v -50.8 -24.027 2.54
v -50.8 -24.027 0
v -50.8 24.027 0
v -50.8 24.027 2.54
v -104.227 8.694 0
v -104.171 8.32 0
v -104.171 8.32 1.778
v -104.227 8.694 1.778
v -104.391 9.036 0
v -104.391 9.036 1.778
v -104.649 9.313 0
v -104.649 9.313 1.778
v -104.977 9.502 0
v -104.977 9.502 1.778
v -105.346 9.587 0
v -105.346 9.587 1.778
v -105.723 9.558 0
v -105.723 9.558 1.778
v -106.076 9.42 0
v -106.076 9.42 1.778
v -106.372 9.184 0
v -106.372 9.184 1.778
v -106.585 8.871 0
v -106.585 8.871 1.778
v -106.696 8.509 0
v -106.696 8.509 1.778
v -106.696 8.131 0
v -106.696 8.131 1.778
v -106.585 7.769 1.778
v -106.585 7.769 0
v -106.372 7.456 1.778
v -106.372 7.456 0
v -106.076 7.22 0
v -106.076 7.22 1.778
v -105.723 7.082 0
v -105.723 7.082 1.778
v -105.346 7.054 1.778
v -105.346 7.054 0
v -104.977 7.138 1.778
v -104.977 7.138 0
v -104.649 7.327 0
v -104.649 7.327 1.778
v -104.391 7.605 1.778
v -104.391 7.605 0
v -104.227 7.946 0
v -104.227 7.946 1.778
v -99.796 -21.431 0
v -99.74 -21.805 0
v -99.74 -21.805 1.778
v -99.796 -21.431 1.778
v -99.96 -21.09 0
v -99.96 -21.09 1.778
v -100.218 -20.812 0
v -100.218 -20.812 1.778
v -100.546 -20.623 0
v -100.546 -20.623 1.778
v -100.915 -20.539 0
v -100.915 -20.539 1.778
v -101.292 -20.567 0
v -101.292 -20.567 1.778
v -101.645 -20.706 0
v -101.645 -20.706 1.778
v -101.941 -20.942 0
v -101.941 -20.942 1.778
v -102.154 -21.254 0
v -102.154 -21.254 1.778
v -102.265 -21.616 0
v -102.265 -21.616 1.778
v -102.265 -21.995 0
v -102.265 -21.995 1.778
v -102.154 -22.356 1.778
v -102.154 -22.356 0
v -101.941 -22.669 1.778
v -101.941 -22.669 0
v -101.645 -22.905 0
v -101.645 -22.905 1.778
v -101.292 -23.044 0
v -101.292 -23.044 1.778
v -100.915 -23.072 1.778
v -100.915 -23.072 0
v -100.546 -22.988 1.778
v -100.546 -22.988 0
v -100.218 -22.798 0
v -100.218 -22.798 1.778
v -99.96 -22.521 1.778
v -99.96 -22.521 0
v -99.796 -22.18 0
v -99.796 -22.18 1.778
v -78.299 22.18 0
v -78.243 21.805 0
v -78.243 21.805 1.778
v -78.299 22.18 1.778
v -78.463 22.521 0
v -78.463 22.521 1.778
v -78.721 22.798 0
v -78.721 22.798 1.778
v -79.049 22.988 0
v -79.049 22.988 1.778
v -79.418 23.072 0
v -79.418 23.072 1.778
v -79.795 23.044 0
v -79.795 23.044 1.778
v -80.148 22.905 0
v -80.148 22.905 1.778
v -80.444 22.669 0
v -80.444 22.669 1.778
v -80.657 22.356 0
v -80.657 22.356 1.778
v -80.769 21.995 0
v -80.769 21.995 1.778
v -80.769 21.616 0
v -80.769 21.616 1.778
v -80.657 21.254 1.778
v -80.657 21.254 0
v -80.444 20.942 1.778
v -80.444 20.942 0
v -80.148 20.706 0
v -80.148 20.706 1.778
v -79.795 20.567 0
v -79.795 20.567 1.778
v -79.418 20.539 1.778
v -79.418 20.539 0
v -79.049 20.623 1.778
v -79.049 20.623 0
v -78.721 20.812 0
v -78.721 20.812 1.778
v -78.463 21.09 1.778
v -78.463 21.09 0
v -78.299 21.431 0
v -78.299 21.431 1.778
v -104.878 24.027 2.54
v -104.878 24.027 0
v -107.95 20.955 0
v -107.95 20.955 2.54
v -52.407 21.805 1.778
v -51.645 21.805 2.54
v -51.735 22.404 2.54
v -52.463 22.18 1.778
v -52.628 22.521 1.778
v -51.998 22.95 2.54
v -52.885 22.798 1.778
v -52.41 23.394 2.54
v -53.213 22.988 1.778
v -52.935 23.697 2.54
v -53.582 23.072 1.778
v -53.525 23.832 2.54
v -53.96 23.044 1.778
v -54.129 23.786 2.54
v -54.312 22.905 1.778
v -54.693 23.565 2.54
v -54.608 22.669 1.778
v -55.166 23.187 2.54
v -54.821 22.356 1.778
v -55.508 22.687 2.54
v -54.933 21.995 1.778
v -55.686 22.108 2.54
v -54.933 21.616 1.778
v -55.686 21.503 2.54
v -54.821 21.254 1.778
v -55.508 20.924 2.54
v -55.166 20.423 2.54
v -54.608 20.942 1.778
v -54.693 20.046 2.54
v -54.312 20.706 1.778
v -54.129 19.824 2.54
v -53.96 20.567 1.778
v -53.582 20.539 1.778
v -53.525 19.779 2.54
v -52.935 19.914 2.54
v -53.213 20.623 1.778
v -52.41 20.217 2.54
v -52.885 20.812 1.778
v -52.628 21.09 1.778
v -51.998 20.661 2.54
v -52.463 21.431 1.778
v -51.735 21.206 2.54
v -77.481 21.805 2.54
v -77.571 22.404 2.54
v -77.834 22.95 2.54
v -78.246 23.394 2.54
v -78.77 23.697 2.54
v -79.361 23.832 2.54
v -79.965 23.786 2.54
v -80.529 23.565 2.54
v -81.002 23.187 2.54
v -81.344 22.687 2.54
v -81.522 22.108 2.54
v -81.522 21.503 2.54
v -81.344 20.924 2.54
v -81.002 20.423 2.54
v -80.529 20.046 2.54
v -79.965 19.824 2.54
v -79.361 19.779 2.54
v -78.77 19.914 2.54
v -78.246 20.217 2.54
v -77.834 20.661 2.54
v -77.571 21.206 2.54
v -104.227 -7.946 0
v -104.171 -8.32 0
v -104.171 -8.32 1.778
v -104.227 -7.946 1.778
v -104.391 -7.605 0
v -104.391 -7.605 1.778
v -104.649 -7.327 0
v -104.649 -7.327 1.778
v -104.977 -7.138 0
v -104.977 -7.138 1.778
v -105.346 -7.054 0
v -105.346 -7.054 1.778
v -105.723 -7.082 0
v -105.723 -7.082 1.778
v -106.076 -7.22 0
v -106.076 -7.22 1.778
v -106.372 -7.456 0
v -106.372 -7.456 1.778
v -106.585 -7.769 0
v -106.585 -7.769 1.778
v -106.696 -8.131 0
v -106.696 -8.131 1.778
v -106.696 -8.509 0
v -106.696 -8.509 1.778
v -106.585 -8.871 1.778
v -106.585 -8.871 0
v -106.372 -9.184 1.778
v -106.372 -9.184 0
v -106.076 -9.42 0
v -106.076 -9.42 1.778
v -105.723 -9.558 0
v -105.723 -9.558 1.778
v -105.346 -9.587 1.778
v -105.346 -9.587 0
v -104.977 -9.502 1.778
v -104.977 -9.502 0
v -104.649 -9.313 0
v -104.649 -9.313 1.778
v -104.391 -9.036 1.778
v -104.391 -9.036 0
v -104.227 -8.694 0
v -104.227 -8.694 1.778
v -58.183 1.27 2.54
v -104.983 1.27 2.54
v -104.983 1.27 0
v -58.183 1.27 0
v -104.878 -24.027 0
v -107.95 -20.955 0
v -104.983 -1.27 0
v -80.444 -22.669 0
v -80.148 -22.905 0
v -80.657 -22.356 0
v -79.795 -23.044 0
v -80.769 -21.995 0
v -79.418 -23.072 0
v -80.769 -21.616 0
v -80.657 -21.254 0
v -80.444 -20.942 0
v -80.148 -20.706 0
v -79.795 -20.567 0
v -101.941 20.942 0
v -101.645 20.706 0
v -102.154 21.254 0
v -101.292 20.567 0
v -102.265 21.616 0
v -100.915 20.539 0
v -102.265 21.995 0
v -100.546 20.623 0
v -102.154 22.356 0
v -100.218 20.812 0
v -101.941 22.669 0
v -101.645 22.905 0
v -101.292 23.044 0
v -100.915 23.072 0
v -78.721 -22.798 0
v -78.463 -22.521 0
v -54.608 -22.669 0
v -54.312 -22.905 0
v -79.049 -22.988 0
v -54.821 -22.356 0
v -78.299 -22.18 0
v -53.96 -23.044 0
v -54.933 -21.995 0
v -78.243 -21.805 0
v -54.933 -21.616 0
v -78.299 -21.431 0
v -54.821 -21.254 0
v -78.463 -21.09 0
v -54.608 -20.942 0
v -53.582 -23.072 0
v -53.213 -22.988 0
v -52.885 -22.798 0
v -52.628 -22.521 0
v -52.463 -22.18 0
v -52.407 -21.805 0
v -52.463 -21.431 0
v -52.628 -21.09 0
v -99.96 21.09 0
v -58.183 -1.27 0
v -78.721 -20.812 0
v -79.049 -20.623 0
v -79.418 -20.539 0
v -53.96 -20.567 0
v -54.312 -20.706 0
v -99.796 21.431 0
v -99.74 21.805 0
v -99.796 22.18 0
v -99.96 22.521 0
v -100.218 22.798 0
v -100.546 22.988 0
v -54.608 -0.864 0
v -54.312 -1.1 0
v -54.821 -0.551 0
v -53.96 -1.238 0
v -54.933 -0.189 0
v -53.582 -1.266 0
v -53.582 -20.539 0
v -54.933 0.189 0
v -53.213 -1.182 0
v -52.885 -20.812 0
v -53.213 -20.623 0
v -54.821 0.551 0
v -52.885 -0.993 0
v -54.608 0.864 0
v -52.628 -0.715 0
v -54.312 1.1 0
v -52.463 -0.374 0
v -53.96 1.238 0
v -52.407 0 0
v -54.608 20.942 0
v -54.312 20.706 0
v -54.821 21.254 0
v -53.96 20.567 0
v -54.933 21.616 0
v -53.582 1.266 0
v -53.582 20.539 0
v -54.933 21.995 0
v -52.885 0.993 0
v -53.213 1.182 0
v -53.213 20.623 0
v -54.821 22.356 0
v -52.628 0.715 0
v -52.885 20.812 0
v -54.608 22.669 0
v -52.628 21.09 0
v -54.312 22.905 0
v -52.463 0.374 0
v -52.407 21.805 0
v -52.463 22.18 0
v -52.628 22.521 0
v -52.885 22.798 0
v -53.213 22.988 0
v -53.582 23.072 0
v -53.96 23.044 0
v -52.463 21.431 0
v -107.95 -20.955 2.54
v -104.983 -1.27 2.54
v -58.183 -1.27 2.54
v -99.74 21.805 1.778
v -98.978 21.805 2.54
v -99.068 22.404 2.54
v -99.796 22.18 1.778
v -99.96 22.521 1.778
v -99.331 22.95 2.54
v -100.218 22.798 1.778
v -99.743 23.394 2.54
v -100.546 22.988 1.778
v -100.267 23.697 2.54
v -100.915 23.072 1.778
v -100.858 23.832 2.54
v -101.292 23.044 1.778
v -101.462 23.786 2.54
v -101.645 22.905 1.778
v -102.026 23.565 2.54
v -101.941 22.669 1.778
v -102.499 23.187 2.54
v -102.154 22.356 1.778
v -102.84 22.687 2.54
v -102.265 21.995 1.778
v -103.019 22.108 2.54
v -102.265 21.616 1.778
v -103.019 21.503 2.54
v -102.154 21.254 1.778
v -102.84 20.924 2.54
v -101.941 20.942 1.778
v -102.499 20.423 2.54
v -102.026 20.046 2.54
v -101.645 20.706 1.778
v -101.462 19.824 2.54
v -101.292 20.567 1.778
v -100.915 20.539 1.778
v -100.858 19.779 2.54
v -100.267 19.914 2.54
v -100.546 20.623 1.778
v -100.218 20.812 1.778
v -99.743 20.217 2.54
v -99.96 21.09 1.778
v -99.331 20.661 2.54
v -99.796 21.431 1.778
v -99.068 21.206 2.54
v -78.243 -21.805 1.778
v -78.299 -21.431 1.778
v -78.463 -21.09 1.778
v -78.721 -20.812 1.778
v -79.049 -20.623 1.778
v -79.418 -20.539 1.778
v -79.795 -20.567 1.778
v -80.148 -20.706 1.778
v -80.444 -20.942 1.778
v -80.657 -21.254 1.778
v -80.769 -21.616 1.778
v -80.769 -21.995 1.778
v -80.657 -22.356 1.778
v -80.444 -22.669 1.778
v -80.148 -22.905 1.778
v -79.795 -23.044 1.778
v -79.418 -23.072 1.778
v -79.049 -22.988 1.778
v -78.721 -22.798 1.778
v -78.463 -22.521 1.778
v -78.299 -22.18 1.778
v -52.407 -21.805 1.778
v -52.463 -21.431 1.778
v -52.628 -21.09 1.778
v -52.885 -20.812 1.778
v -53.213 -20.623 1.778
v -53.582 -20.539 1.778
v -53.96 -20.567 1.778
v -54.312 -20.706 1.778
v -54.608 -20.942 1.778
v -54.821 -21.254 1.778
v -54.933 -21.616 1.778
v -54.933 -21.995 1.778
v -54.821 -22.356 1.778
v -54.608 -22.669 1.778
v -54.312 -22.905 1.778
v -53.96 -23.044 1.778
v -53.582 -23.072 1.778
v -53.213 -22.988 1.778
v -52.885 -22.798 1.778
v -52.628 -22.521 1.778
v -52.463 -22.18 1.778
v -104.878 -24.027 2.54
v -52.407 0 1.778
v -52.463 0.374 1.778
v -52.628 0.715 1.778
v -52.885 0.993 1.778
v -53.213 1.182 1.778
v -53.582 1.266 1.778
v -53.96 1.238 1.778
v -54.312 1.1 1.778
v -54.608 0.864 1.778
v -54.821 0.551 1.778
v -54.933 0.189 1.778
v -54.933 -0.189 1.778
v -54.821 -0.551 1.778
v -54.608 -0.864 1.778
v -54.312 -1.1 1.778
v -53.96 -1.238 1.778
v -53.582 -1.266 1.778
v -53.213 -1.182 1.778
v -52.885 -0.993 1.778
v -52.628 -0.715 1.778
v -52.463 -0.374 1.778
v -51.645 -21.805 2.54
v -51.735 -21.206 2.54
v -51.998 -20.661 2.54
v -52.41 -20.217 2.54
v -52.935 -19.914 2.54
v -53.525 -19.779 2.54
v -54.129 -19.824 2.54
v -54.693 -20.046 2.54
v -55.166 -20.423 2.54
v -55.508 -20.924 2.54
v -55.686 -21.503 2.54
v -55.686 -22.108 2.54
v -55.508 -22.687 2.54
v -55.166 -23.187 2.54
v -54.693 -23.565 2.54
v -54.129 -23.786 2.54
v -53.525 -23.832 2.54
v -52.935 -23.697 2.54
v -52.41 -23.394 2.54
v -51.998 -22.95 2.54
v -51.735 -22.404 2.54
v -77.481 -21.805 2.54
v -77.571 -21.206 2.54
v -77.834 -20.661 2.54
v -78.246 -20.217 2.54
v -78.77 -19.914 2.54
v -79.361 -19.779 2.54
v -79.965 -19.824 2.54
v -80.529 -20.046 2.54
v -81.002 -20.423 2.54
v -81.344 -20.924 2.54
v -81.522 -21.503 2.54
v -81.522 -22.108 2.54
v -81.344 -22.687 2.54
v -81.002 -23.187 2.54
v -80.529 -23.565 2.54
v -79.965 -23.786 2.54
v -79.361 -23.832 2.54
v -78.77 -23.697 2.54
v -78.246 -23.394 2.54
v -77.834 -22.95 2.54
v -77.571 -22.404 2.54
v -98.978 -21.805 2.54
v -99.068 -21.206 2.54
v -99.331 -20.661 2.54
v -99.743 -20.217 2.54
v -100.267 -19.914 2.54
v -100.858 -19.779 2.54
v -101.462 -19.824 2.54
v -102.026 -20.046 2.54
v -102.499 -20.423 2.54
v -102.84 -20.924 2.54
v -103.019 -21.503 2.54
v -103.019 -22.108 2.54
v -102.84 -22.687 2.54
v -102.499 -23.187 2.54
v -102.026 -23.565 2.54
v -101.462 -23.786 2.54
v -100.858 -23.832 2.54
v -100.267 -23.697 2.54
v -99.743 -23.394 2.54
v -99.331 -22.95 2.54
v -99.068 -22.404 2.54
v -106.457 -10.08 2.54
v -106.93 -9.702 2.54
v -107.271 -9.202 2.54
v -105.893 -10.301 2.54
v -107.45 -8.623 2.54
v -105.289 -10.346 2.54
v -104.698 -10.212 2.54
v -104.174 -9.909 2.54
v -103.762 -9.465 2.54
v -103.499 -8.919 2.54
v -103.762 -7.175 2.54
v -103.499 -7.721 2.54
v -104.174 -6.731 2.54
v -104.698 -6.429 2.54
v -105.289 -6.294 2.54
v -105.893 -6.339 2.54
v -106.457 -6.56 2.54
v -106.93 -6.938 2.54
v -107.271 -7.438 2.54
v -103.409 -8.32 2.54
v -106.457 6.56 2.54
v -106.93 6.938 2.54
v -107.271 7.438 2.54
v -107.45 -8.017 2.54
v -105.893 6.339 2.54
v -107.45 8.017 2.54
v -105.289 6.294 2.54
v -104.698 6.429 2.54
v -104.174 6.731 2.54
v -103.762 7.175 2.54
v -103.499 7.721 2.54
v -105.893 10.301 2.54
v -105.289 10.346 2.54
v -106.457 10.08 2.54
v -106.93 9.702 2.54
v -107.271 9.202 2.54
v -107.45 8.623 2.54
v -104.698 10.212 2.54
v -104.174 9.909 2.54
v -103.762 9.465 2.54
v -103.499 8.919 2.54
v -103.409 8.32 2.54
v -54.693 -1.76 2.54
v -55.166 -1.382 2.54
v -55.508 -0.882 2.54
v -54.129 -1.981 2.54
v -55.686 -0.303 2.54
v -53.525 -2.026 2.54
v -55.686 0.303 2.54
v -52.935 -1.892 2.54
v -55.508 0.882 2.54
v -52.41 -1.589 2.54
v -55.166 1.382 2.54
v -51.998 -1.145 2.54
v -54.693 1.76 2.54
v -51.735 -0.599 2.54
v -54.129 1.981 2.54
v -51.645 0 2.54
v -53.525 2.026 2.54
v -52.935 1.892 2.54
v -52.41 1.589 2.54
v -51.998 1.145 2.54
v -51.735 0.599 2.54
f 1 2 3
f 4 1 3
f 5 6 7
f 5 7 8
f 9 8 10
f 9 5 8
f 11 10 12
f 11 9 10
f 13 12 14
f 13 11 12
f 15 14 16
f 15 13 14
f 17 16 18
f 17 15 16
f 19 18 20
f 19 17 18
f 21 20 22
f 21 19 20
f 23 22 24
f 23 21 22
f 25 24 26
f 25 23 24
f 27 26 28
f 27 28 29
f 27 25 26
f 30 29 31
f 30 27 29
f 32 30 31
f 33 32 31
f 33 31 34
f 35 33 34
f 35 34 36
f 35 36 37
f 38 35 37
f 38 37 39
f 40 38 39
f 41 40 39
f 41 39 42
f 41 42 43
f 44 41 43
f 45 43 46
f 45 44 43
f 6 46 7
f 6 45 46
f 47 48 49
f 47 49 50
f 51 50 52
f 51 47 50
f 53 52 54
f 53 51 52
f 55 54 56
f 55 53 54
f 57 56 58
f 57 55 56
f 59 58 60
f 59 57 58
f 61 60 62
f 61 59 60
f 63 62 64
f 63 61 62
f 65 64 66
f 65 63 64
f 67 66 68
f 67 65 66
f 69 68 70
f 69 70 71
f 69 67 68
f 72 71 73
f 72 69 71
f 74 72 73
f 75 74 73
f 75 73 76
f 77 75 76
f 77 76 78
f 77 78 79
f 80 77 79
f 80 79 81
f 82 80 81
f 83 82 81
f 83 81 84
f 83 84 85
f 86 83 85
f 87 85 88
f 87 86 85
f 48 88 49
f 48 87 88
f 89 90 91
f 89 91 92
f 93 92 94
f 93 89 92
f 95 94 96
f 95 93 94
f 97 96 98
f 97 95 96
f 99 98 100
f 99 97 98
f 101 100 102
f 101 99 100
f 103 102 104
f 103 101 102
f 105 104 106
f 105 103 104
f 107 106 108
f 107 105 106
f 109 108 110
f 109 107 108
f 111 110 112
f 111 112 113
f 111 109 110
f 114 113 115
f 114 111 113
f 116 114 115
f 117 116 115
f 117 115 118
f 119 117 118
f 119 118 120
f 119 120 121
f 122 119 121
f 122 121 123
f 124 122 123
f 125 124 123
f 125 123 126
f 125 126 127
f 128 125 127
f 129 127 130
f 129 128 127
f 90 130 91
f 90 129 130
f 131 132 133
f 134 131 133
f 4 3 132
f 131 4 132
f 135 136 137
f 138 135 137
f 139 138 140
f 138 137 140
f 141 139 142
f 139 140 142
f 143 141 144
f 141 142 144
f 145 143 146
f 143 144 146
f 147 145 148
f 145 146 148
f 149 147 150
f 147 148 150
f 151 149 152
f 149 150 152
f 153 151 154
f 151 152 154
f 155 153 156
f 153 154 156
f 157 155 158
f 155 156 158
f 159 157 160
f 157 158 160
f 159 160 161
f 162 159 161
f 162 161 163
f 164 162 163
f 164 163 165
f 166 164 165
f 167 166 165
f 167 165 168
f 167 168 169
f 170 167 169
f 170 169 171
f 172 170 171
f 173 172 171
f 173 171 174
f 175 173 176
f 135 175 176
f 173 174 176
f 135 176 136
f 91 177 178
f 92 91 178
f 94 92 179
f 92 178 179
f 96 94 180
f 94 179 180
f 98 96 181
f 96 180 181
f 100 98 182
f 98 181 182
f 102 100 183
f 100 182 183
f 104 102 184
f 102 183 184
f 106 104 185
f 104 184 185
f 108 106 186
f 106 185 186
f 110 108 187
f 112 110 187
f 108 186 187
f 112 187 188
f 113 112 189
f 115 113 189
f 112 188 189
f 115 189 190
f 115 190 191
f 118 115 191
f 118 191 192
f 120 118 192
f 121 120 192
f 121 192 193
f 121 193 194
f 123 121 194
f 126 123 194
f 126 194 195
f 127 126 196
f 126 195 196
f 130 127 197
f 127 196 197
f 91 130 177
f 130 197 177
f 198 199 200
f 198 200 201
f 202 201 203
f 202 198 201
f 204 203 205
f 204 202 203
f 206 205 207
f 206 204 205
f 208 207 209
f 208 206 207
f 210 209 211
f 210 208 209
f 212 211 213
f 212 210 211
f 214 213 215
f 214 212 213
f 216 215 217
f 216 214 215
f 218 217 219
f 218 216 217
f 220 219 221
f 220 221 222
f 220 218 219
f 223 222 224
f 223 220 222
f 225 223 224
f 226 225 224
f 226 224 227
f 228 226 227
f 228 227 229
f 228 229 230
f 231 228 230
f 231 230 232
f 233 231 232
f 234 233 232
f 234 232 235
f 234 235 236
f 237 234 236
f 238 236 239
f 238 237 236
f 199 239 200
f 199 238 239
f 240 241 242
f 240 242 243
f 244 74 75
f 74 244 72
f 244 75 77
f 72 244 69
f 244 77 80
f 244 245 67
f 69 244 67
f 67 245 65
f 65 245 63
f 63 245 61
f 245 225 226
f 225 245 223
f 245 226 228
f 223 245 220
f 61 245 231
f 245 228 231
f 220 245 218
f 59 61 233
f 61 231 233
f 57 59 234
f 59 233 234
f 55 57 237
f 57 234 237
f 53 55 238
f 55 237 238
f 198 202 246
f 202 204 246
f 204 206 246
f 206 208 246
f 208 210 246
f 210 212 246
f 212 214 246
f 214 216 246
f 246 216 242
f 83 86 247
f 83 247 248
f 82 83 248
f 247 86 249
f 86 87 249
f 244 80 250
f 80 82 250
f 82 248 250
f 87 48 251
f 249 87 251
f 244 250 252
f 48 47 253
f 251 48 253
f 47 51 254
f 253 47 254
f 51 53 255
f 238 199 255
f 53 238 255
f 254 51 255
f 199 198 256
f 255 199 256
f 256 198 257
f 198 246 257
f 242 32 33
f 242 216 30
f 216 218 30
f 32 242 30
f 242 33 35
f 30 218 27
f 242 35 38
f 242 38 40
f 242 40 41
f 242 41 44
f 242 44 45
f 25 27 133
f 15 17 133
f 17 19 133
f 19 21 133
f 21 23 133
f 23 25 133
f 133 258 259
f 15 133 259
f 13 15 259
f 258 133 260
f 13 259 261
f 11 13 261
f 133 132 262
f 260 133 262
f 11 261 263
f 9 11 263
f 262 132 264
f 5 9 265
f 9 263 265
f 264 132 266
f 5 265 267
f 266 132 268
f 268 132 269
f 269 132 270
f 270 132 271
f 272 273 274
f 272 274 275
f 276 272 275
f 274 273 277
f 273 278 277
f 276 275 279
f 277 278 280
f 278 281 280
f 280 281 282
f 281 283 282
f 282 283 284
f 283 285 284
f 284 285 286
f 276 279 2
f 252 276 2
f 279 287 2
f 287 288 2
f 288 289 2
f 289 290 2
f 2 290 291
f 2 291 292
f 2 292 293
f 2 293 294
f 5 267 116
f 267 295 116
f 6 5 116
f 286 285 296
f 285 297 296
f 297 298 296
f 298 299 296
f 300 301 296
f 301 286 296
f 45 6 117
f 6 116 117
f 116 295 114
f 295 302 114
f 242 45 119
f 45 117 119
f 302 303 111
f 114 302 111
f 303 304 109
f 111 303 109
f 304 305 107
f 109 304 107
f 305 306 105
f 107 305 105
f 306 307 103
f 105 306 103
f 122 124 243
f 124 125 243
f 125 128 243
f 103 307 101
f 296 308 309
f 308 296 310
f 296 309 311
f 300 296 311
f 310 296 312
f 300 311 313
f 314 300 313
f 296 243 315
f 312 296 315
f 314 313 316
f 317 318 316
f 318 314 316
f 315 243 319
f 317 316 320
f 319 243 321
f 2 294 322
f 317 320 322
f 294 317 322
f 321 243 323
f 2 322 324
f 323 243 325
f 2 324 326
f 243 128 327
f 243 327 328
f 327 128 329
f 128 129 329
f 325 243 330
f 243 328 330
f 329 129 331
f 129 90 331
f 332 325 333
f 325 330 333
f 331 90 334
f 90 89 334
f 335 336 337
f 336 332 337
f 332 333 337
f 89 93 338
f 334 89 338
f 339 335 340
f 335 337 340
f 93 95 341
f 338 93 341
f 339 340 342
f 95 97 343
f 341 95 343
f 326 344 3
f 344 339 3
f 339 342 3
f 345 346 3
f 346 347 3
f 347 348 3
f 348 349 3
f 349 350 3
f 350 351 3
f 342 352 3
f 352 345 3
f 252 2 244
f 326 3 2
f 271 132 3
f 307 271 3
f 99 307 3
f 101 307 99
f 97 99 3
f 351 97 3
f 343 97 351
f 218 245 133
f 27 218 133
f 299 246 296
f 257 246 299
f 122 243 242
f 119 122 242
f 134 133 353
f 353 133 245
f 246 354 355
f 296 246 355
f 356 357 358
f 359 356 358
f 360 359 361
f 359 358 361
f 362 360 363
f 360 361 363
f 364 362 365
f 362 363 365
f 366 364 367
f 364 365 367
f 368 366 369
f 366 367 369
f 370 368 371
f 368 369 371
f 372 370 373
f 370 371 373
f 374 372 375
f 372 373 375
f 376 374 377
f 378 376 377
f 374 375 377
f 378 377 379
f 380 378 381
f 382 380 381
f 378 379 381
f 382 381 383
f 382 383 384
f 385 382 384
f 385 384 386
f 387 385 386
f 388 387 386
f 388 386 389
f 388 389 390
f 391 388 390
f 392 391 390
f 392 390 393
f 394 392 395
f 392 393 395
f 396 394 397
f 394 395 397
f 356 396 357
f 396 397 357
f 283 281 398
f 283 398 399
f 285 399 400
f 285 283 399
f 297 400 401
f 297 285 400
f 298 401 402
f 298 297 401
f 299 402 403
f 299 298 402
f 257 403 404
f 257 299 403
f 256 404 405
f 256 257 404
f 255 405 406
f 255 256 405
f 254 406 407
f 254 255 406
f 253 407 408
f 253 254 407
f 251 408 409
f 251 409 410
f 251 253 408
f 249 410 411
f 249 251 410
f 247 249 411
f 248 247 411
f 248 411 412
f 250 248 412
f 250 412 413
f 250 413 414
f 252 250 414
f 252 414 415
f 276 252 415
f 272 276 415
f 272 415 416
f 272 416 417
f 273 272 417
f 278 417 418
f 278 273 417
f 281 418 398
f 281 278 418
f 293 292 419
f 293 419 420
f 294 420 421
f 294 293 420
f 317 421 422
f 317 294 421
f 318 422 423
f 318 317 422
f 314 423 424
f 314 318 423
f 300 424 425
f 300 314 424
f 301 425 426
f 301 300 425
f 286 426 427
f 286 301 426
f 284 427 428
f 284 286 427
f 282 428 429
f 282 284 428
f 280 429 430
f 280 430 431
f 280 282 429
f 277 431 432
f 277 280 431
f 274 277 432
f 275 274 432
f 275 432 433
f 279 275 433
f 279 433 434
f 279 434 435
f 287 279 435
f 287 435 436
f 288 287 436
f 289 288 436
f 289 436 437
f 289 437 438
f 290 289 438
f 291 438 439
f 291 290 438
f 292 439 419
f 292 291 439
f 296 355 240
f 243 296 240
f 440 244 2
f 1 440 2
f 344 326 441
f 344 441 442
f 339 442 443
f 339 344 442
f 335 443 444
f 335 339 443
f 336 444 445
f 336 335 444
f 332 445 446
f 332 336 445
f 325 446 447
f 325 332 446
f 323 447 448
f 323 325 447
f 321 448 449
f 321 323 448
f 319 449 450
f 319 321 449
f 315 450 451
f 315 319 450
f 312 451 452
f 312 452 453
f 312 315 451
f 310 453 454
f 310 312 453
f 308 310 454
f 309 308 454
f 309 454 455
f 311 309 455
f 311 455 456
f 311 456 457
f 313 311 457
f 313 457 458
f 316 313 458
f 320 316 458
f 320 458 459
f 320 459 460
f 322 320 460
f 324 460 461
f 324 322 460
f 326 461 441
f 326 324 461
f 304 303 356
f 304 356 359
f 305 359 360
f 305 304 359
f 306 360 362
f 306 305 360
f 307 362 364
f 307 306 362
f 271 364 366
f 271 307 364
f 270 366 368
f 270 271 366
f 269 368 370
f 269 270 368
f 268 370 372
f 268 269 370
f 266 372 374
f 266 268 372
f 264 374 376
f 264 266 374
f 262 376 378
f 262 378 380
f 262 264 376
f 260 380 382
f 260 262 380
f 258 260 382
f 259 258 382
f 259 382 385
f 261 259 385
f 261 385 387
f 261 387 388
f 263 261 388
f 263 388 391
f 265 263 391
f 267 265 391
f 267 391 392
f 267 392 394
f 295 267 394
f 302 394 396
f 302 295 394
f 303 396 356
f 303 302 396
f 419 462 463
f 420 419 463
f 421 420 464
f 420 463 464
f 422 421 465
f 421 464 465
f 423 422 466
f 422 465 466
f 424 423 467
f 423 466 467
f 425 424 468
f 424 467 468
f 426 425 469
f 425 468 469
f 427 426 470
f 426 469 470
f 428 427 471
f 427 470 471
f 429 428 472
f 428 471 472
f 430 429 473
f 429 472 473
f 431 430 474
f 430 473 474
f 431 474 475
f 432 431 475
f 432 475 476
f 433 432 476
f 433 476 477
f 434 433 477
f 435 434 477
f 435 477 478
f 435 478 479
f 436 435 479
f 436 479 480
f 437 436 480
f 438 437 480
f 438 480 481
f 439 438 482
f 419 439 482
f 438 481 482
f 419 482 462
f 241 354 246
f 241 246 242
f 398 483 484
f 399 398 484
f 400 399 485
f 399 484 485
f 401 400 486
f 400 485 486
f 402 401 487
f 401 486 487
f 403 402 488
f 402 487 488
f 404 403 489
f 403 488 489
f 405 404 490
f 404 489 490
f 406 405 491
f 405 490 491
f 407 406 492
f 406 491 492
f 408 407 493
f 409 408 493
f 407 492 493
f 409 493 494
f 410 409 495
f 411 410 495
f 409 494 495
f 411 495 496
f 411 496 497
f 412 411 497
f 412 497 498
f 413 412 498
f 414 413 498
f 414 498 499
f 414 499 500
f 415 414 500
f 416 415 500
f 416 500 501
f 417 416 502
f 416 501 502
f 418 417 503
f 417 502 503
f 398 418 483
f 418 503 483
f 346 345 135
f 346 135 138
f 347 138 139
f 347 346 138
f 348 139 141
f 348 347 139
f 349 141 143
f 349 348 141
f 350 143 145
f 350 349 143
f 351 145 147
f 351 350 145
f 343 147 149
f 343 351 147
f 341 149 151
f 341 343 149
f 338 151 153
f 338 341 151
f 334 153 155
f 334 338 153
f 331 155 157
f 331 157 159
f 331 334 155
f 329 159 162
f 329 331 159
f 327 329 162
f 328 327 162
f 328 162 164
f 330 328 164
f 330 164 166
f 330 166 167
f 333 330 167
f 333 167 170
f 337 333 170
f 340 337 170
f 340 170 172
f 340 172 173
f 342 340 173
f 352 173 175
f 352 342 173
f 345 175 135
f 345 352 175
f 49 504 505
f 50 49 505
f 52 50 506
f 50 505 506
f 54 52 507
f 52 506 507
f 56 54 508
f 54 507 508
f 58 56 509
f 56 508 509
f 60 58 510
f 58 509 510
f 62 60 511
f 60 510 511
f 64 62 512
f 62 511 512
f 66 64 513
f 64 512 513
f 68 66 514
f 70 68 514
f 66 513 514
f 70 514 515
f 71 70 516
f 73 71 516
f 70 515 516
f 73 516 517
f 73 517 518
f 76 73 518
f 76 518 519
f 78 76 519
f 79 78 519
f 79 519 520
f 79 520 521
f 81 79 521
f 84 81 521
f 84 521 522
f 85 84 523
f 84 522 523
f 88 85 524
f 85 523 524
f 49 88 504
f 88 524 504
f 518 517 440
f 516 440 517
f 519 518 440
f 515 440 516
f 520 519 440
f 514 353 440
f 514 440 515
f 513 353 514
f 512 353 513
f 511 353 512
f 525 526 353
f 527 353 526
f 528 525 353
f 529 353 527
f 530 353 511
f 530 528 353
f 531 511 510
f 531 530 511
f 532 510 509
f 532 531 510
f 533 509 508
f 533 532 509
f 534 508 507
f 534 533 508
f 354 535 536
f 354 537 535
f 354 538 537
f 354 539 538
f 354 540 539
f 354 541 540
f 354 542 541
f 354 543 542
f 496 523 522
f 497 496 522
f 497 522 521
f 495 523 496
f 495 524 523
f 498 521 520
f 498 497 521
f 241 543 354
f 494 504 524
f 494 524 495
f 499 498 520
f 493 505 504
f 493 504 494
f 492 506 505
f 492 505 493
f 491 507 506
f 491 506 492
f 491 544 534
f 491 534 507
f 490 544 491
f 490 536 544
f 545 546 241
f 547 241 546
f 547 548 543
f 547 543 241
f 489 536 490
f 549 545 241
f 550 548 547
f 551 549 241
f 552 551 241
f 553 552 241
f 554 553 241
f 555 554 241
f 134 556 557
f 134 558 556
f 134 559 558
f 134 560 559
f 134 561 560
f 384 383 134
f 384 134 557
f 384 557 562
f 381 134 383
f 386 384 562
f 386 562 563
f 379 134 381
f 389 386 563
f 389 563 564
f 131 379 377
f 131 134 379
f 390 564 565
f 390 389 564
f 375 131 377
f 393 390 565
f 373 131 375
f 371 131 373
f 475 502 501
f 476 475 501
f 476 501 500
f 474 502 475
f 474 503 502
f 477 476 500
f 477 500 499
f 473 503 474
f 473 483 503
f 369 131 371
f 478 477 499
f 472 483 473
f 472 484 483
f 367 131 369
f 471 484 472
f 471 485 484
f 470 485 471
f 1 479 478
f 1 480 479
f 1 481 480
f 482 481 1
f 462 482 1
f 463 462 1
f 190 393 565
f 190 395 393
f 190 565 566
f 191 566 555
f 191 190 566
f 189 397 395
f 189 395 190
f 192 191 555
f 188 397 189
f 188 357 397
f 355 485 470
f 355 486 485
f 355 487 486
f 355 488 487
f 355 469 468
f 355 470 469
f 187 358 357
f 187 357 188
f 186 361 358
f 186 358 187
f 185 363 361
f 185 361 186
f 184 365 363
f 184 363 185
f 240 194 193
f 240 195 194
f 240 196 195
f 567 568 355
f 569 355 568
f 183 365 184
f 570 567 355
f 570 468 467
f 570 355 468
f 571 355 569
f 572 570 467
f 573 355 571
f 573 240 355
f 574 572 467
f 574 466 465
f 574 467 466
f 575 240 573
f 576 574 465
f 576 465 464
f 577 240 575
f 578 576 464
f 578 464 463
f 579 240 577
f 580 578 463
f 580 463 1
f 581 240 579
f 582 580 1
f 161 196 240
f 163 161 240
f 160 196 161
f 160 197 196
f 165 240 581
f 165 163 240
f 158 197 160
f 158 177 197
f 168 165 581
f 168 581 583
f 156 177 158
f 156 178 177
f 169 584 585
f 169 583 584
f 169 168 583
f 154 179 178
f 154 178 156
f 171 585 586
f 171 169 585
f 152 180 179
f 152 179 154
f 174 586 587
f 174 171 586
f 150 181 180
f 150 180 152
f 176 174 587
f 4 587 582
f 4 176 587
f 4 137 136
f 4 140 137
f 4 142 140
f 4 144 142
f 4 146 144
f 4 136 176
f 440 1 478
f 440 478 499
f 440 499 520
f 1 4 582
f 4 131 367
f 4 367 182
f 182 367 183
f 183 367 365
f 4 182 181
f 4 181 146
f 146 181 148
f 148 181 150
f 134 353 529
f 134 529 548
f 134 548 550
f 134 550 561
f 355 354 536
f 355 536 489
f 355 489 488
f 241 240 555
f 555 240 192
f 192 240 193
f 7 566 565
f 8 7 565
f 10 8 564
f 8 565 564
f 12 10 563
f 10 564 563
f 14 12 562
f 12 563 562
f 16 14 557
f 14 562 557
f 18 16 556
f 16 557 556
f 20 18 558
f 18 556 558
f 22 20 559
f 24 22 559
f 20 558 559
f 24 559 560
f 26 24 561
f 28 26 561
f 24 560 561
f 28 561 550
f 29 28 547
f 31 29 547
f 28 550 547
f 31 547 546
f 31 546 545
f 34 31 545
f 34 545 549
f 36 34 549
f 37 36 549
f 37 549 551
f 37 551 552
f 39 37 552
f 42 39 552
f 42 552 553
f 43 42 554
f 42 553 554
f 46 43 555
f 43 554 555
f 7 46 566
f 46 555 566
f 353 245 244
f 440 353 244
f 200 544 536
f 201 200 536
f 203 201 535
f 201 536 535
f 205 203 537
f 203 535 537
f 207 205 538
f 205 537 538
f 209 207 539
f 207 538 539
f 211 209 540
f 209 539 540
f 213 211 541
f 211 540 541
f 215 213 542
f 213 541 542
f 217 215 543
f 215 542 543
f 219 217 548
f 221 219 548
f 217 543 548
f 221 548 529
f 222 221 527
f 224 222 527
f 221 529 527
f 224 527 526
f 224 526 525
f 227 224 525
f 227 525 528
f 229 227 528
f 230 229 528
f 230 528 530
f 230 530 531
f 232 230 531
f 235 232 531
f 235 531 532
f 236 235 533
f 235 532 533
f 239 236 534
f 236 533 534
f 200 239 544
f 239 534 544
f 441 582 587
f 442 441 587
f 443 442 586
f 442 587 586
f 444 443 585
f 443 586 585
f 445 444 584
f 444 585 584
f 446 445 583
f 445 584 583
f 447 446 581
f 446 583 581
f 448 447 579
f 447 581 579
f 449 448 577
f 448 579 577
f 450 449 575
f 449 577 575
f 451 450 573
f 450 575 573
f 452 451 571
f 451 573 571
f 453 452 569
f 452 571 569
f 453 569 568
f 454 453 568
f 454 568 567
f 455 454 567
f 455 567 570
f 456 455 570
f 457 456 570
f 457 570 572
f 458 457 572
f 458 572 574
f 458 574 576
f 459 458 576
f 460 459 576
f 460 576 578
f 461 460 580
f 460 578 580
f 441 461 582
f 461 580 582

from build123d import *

# Parameters (mm, degrees)
SKETCH1_R           = 1.27
BOSS_EXTRUDE1_DEPTH = 2.54
CHAMFER1_SIZE       = 0.762
SKETCH2_W           = 46.799762806
SKETCH2_H           = 2.54
CUT_EXTRUDE1_DEPTH  = 5.334


with BuildPart() as part:
    # Sketch1 → Boss-Extrude1 (new body)
    with BuildSketch(Plane.XY):
        Polygon((-104.877780152, -24.027219848), (-50.8, -24.027219848), (-50.8, 24.027219848), (-104.877780152, 24.027219848), (-107.95, 20.955), (-107.95, -20.955), align=None)
        with Locations((-101.009537176, 21.805359873)):
            Circle(SKETCH1_R, mode=Mode.SUBTRACT)
        with Locations((-79.51282161, 21.805359873)):
            Circle(SKETCH1_R, mode=Mode.SUBTRACT)
        with Locations((-53.676916467, 21.805359873)):
            Circle(SKETCH1_R, mode=Mode.SUBTRACT)
        with Locations((-53.676916467, 0)):
            Circle(SKETCH1_R, mode=Mode.SUBTRACT)
        with Locations((-53.676916467, -21.805359873)):
            Circle(SKETCH1_R, mode=Mode.SUBTRACT)
        with Locations((-79.51282161, -21.805359873)):
            Circle(SKETCH1_R, mode=Mode.SUBTRACT)
        with Locations((-101.009537176, -21.805359873)):
            Circle(SKETCH1_R, mode=Mode.SUBTRACT)
        with Locations((-105.440631813, -8.320112928)):
            Circle(SKETCH1_R, mode=Mode.SUBTRACT)
        with Locations((-105.440631813, 8.320112928)):
            Circle(SKETCH1_R, mode=Mode.SUBTRACT)
    extrude(amount=BOSS_EXTRUDE1_DEPTH)

    # Chamfer1
    chamfer1_edges = [part.edges().sort_by_distance(p)[0] for p in [
        (-80.78282161, 21.805359873, 2.54),
        (-54.946916467, 21.805359873, 2.54),
        (-102.279537176, 21.805359873, 2.54),
        (-54.946916467, 0, 2.54),
        (-54.946916467, -21.805359873, 2.54),
        (-80.78282161, -21.805359873, 2.54),
        (-102.279537176, -21.805359873, 2.54),
        (-106.710631813, -8.320112928, 2.54),
        (-106.710631813, 8.320112928, 2.54),
    ]]
    chamfer(chamfer1_edges, length=CHAMFER1_SIZE)

    # Sketch2 → Cut-Extrude1 (cut)
    with BuildSketch(Plane.XY.offset(2.54)):
        with Locations((-81.583109387, 0)):
            Rectangle(SKETCH2_W, SKETCH2_H)
    extrude(amount=-CUT_EXTRUDE1_DEPTH, mode=Mode.SUBTRACT)


solid = part.part
